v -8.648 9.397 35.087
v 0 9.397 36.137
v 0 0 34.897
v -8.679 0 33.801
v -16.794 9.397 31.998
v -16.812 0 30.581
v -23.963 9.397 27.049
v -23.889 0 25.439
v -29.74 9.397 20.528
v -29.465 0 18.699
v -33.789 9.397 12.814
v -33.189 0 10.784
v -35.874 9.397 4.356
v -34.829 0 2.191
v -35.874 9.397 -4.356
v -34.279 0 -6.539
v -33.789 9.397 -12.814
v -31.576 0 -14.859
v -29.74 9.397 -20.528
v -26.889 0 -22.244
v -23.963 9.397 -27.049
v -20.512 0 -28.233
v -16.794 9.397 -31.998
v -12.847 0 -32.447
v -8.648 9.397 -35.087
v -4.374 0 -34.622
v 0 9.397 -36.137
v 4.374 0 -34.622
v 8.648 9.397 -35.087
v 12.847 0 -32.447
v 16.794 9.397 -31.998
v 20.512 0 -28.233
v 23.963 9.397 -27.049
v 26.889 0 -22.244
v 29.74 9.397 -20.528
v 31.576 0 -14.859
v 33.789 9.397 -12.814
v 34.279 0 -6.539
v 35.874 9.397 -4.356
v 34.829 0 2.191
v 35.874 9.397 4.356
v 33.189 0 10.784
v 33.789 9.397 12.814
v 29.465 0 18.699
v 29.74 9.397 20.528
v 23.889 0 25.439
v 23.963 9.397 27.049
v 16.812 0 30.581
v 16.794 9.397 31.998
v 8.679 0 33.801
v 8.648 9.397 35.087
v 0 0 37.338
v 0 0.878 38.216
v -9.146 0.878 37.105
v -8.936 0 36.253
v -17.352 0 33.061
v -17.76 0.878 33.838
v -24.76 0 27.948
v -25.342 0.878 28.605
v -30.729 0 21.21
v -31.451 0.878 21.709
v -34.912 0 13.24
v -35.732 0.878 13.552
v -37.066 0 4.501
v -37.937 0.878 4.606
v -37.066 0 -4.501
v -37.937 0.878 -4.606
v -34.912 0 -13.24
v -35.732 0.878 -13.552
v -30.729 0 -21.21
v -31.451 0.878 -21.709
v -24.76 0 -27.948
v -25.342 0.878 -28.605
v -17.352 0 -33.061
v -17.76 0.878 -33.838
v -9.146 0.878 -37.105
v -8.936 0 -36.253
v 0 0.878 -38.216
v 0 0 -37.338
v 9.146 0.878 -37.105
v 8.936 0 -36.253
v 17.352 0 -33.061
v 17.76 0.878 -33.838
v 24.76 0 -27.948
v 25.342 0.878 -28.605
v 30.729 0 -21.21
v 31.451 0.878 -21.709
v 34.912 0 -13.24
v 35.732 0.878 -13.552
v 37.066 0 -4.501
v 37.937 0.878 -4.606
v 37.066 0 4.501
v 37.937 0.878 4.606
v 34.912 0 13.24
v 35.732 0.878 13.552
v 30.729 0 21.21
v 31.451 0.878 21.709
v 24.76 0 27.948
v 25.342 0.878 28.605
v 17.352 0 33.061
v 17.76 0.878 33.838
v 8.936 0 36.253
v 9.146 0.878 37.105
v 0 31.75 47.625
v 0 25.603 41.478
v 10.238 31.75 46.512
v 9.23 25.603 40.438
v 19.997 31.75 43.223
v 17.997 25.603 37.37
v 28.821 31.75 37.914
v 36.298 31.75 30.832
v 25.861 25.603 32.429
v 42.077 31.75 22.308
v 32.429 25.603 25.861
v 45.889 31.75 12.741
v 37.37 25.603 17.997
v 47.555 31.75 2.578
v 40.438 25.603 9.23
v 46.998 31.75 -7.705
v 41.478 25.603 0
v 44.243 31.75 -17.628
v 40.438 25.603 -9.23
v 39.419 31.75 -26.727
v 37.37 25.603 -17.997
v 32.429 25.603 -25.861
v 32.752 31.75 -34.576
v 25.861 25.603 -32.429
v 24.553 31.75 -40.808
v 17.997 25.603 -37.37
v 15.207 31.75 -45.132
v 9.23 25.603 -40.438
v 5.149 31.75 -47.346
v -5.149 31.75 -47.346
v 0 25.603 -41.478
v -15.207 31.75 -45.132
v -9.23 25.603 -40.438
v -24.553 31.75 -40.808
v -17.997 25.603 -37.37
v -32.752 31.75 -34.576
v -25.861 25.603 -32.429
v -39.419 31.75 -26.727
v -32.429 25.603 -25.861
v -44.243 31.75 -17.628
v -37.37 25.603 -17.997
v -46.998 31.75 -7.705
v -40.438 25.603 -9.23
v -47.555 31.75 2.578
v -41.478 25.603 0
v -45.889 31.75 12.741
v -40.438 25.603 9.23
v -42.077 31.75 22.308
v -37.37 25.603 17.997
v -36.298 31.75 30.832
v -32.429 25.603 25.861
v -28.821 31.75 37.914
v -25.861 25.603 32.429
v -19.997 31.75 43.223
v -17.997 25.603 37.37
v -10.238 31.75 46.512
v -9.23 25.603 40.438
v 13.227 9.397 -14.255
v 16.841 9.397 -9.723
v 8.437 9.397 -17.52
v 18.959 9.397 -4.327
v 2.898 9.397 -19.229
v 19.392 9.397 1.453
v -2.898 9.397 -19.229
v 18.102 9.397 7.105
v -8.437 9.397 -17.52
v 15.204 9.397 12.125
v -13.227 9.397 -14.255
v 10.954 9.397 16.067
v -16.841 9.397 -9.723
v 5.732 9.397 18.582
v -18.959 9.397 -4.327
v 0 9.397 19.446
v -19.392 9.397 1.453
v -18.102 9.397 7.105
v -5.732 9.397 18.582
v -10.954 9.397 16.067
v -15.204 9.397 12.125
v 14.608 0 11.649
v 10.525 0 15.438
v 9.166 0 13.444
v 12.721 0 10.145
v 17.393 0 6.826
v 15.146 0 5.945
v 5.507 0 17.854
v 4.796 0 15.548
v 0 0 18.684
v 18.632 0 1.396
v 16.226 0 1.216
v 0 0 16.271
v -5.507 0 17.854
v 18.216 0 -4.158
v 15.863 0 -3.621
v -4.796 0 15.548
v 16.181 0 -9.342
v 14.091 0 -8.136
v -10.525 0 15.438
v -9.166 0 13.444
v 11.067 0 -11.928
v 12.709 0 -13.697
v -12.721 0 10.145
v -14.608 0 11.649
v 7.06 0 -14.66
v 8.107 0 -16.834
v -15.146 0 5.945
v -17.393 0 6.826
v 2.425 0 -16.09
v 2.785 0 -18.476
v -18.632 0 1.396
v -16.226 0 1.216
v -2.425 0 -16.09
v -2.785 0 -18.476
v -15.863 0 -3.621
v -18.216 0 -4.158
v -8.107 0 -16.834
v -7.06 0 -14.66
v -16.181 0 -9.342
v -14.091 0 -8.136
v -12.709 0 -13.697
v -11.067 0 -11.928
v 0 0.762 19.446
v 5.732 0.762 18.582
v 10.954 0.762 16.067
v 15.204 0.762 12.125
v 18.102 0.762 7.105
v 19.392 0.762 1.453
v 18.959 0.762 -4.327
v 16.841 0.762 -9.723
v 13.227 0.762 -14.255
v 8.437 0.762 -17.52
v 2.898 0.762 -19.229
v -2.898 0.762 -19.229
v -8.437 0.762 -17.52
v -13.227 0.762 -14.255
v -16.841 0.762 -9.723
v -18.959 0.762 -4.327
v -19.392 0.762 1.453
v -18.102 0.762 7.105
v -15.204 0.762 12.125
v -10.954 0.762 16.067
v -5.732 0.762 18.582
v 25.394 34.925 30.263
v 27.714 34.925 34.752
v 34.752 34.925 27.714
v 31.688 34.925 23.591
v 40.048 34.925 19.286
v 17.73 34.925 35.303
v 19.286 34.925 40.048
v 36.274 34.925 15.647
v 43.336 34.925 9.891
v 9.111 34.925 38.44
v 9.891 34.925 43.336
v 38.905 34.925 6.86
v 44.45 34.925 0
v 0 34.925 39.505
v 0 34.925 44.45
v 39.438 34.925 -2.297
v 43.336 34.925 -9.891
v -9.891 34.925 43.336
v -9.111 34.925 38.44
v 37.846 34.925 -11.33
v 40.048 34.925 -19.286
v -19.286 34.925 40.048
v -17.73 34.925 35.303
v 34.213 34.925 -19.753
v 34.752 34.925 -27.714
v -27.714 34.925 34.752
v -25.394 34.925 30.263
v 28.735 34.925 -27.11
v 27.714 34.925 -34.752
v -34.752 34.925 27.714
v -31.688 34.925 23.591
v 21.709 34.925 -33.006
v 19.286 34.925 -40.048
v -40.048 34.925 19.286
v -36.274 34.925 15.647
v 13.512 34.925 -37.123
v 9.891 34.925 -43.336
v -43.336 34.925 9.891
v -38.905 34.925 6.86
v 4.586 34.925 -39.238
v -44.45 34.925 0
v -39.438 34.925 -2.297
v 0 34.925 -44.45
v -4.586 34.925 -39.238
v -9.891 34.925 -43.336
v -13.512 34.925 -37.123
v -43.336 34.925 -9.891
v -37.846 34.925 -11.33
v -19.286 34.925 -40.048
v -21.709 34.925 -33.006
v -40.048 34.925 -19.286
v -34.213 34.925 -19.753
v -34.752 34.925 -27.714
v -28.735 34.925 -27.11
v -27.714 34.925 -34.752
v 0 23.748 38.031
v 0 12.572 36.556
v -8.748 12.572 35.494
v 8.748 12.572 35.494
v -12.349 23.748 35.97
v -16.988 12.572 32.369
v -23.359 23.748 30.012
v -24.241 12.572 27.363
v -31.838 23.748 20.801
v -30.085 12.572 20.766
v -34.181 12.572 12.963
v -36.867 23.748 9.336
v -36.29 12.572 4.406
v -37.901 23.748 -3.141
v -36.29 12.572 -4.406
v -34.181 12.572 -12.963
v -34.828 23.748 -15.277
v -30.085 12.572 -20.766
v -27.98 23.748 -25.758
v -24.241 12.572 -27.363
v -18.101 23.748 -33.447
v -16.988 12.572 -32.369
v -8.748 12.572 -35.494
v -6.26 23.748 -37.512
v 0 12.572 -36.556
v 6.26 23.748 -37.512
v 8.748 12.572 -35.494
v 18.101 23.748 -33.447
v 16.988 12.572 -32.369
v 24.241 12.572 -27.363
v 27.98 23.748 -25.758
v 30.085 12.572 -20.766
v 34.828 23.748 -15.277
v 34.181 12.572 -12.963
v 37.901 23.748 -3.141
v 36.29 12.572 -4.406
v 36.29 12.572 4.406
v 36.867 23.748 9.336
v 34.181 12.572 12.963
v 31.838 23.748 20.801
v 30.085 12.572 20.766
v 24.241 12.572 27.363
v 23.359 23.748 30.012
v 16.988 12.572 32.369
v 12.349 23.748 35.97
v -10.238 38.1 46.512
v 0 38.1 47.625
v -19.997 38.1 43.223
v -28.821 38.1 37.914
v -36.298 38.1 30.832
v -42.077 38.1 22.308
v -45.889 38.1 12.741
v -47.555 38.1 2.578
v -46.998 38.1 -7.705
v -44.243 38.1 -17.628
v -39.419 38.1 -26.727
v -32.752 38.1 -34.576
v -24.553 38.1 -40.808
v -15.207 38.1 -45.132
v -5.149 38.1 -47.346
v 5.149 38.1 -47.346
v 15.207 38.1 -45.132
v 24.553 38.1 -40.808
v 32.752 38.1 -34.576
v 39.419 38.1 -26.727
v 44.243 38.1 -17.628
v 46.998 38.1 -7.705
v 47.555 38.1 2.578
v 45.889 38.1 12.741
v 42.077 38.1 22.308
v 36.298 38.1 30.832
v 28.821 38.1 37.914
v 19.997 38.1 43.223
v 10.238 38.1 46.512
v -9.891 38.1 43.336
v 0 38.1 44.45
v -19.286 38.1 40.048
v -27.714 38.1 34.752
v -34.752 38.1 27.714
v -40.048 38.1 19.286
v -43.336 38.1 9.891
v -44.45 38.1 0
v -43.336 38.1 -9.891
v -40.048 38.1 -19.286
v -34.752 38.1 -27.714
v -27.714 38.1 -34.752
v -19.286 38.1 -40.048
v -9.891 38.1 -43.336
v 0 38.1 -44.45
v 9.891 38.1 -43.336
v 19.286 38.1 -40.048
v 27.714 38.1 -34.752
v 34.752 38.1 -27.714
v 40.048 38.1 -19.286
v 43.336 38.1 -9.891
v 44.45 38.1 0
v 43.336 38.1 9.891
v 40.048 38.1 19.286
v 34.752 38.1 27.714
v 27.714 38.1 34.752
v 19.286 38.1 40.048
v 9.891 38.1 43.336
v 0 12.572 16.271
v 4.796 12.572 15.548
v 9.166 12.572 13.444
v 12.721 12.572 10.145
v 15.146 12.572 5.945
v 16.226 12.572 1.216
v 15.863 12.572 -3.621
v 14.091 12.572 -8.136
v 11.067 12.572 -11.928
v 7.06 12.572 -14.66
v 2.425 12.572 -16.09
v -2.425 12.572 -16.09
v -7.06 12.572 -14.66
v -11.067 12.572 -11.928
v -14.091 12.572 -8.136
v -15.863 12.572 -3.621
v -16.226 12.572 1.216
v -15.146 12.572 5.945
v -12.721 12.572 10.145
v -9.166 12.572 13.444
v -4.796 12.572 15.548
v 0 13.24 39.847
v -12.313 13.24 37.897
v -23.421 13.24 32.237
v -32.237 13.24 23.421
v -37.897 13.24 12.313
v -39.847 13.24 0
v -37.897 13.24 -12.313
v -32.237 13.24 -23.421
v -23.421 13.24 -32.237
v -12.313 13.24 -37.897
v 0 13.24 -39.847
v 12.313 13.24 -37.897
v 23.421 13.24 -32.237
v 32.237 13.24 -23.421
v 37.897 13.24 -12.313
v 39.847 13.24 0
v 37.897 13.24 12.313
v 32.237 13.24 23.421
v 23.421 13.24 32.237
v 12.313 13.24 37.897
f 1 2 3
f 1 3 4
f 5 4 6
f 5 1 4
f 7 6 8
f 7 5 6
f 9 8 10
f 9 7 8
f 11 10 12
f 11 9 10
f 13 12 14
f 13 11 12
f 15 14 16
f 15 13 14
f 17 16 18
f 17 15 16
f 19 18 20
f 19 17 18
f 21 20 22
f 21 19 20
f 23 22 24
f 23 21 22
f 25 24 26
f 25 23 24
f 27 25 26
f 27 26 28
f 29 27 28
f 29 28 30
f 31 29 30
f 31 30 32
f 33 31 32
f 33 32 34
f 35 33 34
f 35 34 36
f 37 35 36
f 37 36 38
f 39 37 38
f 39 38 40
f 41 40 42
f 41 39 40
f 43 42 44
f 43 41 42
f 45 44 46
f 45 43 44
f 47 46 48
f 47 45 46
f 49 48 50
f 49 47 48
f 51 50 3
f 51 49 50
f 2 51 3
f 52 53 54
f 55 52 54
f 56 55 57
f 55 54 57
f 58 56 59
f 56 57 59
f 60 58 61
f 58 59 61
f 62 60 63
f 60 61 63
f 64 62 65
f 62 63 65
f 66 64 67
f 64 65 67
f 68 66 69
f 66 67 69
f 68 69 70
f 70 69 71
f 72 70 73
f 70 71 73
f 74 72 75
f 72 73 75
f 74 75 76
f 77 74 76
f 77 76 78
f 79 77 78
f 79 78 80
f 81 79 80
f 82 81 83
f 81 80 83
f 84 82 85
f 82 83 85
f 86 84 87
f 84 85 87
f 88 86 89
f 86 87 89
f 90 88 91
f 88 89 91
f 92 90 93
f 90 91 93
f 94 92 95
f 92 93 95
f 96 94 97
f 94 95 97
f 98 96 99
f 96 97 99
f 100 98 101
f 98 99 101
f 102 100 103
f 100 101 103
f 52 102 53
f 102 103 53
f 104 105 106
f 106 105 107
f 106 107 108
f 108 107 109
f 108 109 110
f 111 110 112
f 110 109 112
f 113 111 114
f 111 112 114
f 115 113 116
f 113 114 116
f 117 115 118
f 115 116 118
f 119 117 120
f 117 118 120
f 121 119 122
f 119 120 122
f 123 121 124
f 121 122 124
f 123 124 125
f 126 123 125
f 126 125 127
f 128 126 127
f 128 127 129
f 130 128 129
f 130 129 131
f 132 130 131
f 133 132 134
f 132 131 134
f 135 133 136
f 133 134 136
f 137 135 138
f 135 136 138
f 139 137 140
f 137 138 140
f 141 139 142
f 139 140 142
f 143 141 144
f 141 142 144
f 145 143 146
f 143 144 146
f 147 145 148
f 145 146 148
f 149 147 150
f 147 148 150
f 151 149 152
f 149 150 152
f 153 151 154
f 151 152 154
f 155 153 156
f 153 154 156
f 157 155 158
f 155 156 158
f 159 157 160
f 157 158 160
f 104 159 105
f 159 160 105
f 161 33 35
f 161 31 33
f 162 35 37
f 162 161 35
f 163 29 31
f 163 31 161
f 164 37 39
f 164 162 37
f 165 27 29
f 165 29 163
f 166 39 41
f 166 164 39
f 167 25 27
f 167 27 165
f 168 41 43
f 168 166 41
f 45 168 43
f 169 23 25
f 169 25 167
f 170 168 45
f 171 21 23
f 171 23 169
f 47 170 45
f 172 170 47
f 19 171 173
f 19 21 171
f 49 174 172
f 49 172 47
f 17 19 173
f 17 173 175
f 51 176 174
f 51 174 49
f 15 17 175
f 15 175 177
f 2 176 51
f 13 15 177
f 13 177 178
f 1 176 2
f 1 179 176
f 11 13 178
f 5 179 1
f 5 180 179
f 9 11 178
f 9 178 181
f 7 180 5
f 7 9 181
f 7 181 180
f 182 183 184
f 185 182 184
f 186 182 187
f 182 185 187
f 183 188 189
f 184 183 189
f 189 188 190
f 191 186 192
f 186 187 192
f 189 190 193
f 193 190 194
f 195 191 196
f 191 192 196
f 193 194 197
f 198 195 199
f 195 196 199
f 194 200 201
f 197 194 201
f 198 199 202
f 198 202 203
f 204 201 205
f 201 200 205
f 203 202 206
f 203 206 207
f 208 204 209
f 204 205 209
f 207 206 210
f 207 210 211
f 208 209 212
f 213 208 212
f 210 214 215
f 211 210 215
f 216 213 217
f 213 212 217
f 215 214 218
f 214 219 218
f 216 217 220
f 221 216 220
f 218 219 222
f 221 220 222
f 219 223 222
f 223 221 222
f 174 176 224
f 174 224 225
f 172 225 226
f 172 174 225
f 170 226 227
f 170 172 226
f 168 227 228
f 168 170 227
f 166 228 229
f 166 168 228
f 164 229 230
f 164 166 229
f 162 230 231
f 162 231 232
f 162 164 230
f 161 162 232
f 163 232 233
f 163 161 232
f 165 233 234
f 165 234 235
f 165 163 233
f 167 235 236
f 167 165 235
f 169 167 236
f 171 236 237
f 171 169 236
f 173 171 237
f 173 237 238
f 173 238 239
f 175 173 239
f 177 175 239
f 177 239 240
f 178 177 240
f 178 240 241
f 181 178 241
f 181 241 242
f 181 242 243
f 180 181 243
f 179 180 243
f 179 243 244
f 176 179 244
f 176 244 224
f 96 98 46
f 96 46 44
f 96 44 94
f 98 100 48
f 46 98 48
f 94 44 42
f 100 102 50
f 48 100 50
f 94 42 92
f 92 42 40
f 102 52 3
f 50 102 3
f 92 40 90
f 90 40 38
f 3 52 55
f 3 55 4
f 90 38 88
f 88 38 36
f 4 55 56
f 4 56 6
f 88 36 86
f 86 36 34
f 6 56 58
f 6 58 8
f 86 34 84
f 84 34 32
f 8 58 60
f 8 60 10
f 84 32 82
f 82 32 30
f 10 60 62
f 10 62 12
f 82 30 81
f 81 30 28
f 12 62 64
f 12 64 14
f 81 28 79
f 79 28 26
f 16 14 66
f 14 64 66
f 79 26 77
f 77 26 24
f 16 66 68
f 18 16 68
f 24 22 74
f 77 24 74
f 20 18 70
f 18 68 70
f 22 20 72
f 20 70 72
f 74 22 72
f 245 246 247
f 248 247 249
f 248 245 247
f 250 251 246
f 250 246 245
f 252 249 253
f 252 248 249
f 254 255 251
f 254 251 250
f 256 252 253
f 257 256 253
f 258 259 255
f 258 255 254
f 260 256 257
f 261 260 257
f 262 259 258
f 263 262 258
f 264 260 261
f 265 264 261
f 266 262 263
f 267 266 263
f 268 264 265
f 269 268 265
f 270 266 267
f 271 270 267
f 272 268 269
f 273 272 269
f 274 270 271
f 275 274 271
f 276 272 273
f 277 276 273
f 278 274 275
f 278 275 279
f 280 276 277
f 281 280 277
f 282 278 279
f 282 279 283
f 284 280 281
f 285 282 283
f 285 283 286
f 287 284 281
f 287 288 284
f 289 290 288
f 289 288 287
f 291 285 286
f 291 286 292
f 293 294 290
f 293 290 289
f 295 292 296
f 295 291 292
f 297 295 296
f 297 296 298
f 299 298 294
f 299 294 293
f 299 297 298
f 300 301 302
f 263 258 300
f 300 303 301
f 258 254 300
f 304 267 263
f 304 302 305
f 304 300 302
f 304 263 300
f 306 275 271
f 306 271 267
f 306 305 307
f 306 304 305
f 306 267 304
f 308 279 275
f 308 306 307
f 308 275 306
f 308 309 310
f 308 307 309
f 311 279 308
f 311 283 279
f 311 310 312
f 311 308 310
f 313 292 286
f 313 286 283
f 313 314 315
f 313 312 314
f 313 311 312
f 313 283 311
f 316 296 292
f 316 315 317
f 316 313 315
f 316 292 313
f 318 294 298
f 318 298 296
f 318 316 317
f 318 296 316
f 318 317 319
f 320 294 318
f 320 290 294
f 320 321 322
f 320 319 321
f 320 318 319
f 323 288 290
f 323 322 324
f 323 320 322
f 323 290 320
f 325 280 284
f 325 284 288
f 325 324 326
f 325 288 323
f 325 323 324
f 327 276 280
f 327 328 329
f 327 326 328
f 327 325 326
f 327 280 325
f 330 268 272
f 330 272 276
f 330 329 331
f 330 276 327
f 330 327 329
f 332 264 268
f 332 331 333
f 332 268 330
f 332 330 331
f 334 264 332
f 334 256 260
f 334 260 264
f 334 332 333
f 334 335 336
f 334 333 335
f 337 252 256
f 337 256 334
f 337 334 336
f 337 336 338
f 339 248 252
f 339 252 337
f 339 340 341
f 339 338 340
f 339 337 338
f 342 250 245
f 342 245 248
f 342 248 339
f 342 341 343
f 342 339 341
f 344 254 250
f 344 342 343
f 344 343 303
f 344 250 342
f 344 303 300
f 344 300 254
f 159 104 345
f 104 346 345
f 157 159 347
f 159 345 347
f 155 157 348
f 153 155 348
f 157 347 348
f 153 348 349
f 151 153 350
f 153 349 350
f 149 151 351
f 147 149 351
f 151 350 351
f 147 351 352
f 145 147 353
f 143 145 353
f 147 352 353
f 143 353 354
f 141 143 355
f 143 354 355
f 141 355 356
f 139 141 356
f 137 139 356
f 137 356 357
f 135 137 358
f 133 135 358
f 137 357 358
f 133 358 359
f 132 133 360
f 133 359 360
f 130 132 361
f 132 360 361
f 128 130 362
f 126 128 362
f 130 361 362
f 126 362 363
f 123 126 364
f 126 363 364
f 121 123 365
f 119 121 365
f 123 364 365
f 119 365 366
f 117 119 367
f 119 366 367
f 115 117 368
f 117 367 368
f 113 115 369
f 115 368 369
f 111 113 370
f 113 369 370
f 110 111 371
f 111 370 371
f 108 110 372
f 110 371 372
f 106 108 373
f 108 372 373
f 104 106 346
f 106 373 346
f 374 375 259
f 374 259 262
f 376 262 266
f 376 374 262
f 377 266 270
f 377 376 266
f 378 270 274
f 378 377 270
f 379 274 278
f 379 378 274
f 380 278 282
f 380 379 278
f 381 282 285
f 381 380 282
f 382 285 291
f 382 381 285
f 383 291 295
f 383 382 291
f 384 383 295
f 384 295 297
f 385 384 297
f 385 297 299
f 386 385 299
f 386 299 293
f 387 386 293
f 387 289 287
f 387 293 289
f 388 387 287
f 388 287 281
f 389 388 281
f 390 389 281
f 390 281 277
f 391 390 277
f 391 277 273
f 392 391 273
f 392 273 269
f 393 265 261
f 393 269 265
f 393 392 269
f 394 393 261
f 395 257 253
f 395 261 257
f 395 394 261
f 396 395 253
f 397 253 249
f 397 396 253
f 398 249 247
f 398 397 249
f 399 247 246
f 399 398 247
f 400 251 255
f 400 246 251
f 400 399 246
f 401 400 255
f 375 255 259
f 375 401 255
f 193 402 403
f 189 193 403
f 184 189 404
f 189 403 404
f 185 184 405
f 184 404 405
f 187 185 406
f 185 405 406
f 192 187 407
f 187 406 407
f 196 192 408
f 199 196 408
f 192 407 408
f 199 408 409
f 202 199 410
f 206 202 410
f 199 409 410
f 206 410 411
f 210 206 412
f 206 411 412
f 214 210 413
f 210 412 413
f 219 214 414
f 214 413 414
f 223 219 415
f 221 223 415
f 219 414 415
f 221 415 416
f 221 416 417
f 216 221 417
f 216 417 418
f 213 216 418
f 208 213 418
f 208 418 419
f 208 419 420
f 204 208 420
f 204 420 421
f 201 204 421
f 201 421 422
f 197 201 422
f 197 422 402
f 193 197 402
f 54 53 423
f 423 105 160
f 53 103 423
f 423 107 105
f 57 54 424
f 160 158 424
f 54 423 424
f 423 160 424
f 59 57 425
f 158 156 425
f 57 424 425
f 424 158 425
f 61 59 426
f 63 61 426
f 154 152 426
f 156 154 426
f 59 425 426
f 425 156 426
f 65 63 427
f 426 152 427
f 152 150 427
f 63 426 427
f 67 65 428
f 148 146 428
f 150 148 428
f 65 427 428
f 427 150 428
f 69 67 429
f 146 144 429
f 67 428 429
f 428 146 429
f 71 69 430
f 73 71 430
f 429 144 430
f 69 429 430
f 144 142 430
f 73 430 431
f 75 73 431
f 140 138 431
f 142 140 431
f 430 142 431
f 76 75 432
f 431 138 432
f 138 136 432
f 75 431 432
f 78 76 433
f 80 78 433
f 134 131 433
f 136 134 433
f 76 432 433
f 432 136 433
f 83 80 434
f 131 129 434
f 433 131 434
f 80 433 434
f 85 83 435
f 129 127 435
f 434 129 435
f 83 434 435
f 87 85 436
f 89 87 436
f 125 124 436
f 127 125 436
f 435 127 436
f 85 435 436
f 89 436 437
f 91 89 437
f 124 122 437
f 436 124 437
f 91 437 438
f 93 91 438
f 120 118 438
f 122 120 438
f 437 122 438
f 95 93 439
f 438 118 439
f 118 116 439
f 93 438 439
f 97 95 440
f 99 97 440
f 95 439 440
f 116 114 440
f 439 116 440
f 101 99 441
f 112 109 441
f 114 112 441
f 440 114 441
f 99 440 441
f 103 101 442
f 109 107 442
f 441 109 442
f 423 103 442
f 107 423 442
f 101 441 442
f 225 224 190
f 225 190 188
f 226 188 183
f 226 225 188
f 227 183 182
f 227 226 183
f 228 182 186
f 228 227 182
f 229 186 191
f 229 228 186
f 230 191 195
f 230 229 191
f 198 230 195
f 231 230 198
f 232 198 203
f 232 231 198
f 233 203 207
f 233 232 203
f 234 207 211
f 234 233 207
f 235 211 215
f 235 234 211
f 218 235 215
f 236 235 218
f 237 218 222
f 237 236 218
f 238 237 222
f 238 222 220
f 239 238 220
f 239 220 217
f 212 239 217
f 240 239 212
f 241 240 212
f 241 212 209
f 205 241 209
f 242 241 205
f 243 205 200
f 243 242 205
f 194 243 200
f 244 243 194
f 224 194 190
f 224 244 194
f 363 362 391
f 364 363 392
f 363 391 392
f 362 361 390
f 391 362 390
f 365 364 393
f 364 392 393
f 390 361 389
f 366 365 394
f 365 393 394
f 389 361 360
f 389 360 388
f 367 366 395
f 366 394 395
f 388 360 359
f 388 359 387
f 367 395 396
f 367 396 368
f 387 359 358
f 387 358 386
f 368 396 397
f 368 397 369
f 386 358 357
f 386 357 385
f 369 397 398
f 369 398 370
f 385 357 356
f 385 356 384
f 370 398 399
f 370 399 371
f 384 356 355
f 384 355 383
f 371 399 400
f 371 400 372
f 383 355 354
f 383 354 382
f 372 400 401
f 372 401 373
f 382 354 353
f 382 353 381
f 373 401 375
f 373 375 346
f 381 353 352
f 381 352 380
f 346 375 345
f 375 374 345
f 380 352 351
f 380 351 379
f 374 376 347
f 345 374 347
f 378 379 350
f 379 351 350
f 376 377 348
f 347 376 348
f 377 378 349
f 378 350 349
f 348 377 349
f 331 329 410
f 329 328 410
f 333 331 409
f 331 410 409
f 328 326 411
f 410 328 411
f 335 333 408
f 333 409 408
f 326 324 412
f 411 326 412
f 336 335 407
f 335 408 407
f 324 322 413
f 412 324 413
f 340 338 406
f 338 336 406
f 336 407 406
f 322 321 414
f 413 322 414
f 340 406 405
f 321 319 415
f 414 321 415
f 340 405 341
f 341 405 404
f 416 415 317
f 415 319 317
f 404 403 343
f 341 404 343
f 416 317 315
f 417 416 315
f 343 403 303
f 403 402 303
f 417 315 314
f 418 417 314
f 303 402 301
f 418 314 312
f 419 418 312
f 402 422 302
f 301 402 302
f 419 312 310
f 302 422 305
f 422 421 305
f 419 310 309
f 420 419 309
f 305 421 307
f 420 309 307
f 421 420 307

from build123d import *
from OCP.BRepFilletAPI import BRepFilletAPI_MakeChamfer

# Parameters (mm, degrees)
SHELL1_T           = -3.175
SKETCH3_R          = 16.27124
CUT_EXTRUDE1_DEPTH = 73.027519701
SHELL3_T           = -3.175
CHAMFER1_SIZE      = 0.762
CHAMFER1_SIZE2     = 0.885421272


with BuildPart() as part:
    # Sketch1 → Revolve2 (revolve)
    with BuildSketch(Plane(origin=(0, 0, 0), x_dir=(0, 0, -1), z_dir=(1, 0, 0)), mode=Mode.PRIVATE) as revolve2_sk:
        Polygon((0, 0), (38.1, 0), (42.288930477, 31.75), (47.625, 31.75), (47.625, 38.1), (0, 38.1), align=None)
    revolve(revolve2_sk.sketch.rotate(Axis((0, 0, 0), (0, -1, 0)), 180), axis=Axis((0, 0, 0), (0, -1, 0)))

    # Shell1
    shell1_openings = [part.faces().sort_by_distance(p)[0] for p in [
        (0, 38.1, 0),
    ]]
    offset(amount=SHELL1_T, openings=shell1_openings, kind=Kind.INTERSECTION)

    # Sketch2 → Revolve3 (revolve)
    with BuildSketch(Plane.XY, mode=Mode.PRIVATE) as revolve3_sk:
        Polygon((-37.277313556, 12.571930266), (0, 12.571930266), (0, 1.888797723), (-36.368110787, 1.888797723), align=None)
    revolve(revolve3_sk.sketch.rotate(Axis((0, 0, 0), (0, -1, 0)), 270), axis=Axis((0, 0, 0), (0, -1, 0)))

    # Sketch3 → Cut-Extrude1 (cut, through all)
    with BuildSketch(Plane(origin=(0, 12.571930266, 0), x_dir=(1, 0, 0), z_dir=(0, 1, 0))):
        with Locations(Location((0, 0, 0), (0, 0, 270))):
            Circle(SKETCH3_R)
    extrude(amount=-CUT_EXTRUDE1_DEPTH, mode=Mode.SUBTRACT)

    # Shell3
    shell3_openings = [part.faces().sort_by_distance(p)[0] for p in [
        (0, 0, -37.022369265),
    ]]
    offset(amount=SHELL3_T, openings=shell3_openings, kind=Kind.INTERSECTION)

    # Sketch4 → Revolve4 (revolve)
    with BuildSketch(Plane.XY, mode=Mode.PRIVATE) as revolve4_sk:
        Polygon((-47.625, 31.75), (-40.729010951, 24.854010951), (-40.729010951, 32.355083401), (-47.625, 32.355083401), align=None)
    revolve(revolve4_sk.sketch.rotate(Axis((0, 0, 0), (0, 1, 0)), 90), axis=Axis((0, 0, 0), (0, 1, 0)))

    # Chamfer1: one chamfer whose edges measure the first distance from different faces: ONE call of the kernel's chamfer builder (chamfer() names one face for all edges)
    chamfer1_edges_1 = [part.edges().sort_by_distance(p)[0] for p in [
        (0, 0, -19.44624),
    ]]
    chamfer1_edges_2 = [part.edges().sort_by_distance(p)[0] for p in [
        (0, 0, -38.1),
    ]]
    chamfer1_side_2 = [part.faces().sort_by_distance(p)[0] for p in [
        (0, 0, -35.975116662),
    ]]
    chamfer1 = BRepFilletAPI_MakeChamfer(part.part.solid().wrapped)
    for e in chamfer1_edges_1:
        chamfer1.Add(CHAMFER1_SIZE, e.wrapped)
    for e in chamfer1_edges_2:
        chamfer1.Add(CHAMFER1_SIZE, CHAMFER1_SIZE2, e.wrapped, chamfer1_side_2[0].wrapped)  # the first distance lies on this face
    add(Compound.cast(chamfer1.Shape()), mode=Mode.REPLACE)


solid = part.part
